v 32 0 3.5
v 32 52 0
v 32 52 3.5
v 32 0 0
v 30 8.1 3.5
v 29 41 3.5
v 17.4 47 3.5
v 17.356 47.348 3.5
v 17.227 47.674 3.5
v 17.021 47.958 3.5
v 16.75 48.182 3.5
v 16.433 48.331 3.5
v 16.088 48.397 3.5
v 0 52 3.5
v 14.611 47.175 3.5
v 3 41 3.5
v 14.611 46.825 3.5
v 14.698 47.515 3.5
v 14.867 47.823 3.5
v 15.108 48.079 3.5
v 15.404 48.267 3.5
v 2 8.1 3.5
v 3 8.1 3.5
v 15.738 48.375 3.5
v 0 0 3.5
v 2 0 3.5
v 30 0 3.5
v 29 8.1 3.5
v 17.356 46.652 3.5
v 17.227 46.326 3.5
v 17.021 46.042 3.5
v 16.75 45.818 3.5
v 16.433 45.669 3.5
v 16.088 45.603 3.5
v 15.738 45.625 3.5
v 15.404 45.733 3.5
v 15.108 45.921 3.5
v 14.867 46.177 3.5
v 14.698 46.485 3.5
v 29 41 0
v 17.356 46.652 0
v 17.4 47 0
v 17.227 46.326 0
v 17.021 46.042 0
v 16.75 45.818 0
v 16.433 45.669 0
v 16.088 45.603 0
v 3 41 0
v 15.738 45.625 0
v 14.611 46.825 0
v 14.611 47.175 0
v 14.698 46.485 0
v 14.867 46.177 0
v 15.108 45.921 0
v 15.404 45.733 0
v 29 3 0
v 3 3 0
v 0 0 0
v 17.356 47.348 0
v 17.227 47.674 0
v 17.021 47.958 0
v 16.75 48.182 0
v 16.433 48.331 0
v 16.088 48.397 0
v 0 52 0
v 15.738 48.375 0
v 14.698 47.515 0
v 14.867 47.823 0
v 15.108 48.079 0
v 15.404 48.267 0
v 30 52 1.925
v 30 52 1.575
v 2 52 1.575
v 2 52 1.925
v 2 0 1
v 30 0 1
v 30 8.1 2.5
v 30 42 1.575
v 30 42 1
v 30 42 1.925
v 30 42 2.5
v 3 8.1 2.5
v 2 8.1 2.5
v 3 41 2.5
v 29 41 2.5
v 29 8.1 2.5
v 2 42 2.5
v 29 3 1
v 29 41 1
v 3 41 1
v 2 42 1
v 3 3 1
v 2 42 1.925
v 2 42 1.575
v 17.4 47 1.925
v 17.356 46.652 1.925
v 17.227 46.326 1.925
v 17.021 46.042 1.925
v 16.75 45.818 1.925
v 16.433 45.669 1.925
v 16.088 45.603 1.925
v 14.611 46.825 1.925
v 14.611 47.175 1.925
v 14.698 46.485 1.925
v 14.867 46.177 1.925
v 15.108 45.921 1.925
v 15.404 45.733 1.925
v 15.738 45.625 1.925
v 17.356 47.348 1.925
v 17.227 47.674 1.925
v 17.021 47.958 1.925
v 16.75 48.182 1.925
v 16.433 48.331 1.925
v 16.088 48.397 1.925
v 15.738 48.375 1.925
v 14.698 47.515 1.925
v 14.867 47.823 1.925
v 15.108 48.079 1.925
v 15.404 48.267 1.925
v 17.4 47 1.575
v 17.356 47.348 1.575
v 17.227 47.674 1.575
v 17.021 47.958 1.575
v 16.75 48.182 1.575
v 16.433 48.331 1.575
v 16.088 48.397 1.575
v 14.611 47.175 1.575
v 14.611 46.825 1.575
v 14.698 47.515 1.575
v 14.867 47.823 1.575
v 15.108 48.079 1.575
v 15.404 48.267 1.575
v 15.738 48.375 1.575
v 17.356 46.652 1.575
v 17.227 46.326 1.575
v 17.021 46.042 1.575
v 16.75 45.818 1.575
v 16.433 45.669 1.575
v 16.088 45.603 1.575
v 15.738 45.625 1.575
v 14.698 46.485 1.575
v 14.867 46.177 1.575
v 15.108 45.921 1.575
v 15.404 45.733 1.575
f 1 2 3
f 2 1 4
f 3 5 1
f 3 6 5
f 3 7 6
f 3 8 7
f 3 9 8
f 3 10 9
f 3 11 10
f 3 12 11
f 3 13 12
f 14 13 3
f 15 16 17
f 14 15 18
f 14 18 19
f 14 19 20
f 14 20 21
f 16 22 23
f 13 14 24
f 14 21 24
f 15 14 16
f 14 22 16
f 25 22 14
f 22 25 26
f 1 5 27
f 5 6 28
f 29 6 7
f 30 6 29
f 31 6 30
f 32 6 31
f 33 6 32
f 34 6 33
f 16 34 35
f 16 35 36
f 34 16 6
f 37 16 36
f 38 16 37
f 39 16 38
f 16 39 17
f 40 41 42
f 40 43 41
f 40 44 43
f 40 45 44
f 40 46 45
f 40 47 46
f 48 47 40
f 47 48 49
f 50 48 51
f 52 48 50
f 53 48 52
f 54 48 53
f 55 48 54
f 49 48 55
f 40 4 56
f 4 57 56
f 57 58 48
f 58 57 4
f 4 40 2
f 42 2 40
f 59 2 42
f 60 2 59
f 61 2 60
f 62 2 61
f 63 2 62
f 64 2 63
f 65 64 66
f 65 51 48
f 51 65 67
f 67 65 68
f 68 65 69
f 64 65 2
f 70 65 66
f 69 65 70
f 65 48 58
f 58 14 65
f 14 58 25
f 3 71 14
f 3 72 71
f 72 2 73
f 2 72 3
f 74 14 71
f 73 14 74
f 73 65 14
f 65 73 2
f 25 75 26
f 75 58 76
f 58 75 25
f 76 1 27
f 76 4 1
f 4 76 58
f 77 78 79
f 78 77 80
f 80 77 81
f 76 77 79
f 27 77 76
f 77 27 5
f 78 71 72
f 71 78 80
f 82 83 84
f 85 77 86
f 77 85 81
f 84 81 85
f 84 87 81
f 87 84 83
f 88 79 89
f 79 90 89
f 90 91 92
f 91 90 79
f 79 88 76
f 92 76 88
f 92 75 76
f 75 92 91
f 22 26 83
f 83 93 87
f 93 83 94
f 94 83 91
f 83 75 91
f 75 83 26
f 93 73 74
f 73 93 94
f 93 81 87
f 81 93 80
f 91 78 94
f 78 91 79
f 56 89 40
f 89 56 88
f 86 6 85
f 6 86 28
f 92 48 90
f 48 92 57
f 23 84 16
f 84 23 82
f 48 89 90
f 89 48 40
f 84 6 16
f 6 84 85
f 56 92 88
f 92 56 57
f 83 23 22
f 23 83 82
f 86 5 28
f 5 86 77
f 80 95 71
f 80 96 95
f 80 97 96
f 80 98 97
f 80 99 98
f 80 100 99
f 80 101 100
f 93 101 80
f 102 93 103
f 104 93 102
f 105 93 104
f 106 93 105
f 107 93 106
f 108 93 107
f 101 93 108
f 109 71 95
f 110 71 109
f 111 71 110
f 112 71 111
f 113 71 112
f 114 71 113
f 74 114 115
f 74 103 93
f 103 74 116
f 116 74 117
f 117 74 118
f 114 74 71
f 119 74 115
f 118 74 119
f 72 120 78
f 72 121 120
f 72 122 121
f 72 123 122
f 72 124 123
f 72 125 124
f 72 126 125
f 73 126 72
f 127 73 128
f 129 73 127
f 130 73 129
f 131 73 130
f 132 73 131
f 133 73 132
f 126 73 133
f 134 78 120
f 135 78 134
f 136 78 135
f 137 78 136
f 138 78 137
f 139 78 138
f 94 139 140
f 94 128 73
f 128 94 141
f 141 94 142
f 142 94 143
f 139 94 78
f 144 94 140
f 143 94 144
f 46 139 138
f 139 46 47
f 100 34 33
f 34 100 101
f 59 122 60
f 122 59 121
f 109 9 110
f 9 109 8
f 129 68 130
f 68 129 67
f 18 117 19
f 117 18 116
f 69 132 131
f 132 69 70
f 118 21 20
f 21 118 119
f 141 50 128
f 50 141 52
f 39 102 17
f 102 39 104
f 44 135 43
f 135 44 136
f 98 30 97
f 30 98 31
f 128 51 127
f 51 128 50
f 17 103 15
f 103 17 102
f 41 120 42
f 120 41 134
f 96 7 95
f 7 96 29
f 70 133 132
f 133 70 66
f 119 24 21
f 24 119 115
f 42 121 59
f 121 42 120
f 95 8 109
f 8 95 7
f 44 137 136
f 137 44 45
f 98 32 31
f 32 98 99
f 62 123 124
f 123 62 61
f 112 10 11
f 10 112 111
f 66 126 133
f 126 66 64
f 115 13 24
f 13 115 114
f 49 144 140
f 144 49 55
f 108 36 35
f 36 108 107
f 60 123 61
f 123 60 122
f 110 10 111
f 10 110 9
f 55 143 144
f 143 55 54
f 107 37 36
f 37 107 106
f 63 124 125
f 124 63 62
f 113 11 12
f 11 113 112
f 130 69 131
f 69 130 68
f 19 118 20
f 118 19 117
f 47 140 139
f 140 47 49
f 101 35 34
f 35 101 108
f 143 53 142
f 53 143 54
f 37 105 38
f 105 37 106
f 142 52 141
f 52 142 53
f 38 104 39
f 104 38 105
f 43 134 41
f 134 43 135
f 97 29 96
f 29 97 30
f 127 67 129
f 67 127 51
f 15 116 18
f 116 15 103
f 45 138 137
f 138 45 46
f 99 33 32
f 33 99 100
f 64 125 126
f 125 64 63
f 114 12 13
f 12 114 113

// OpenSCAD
w = 28; // width of sdcard board
m0 = 4; // modifier added to width (to make outer size)

d = 42;  // depth of sdcard board
m1 = 10; // modifier added to depth (to make space for shim)

h = 1.5; // methane board pcb thickness
m2 = 2;  // modifier added to height (to make outer size)

shim = .350;
m3 = 2.8;      //Diameter of m3 screw

$fn = 25; //Set # of sides on a cylinder
difference(){
	cube([w+m0,d+m1,h+m2]); //outer most cube

	//PCB slot
	color([1,0,0])translate([m0/2,-.1,(m2)/2])cube([w,d+.1,h]);

	//Clearance for the electronics
	color([0,1,0])translate([3,3,-.1])cube([w-2,d-4,h+m2+.2]);

	//Opening the front up
	color([0,0,1])translate([2,-.1,m2+.1/2])cube([w,3+.2+5,m2+1]);

	//Shim hole
	translate([m0/2,d-.1,(h+2-shim)/2]){
		color([0,1,1])cube([w,w+m0+.2,shim]);
	}

	//Set screw hole to hold shim
	translate([(w+m0)/2,d+(m1/2),-.1]){
		cylinder(r = m3/2, h = h+m2+.2);
	}
}
